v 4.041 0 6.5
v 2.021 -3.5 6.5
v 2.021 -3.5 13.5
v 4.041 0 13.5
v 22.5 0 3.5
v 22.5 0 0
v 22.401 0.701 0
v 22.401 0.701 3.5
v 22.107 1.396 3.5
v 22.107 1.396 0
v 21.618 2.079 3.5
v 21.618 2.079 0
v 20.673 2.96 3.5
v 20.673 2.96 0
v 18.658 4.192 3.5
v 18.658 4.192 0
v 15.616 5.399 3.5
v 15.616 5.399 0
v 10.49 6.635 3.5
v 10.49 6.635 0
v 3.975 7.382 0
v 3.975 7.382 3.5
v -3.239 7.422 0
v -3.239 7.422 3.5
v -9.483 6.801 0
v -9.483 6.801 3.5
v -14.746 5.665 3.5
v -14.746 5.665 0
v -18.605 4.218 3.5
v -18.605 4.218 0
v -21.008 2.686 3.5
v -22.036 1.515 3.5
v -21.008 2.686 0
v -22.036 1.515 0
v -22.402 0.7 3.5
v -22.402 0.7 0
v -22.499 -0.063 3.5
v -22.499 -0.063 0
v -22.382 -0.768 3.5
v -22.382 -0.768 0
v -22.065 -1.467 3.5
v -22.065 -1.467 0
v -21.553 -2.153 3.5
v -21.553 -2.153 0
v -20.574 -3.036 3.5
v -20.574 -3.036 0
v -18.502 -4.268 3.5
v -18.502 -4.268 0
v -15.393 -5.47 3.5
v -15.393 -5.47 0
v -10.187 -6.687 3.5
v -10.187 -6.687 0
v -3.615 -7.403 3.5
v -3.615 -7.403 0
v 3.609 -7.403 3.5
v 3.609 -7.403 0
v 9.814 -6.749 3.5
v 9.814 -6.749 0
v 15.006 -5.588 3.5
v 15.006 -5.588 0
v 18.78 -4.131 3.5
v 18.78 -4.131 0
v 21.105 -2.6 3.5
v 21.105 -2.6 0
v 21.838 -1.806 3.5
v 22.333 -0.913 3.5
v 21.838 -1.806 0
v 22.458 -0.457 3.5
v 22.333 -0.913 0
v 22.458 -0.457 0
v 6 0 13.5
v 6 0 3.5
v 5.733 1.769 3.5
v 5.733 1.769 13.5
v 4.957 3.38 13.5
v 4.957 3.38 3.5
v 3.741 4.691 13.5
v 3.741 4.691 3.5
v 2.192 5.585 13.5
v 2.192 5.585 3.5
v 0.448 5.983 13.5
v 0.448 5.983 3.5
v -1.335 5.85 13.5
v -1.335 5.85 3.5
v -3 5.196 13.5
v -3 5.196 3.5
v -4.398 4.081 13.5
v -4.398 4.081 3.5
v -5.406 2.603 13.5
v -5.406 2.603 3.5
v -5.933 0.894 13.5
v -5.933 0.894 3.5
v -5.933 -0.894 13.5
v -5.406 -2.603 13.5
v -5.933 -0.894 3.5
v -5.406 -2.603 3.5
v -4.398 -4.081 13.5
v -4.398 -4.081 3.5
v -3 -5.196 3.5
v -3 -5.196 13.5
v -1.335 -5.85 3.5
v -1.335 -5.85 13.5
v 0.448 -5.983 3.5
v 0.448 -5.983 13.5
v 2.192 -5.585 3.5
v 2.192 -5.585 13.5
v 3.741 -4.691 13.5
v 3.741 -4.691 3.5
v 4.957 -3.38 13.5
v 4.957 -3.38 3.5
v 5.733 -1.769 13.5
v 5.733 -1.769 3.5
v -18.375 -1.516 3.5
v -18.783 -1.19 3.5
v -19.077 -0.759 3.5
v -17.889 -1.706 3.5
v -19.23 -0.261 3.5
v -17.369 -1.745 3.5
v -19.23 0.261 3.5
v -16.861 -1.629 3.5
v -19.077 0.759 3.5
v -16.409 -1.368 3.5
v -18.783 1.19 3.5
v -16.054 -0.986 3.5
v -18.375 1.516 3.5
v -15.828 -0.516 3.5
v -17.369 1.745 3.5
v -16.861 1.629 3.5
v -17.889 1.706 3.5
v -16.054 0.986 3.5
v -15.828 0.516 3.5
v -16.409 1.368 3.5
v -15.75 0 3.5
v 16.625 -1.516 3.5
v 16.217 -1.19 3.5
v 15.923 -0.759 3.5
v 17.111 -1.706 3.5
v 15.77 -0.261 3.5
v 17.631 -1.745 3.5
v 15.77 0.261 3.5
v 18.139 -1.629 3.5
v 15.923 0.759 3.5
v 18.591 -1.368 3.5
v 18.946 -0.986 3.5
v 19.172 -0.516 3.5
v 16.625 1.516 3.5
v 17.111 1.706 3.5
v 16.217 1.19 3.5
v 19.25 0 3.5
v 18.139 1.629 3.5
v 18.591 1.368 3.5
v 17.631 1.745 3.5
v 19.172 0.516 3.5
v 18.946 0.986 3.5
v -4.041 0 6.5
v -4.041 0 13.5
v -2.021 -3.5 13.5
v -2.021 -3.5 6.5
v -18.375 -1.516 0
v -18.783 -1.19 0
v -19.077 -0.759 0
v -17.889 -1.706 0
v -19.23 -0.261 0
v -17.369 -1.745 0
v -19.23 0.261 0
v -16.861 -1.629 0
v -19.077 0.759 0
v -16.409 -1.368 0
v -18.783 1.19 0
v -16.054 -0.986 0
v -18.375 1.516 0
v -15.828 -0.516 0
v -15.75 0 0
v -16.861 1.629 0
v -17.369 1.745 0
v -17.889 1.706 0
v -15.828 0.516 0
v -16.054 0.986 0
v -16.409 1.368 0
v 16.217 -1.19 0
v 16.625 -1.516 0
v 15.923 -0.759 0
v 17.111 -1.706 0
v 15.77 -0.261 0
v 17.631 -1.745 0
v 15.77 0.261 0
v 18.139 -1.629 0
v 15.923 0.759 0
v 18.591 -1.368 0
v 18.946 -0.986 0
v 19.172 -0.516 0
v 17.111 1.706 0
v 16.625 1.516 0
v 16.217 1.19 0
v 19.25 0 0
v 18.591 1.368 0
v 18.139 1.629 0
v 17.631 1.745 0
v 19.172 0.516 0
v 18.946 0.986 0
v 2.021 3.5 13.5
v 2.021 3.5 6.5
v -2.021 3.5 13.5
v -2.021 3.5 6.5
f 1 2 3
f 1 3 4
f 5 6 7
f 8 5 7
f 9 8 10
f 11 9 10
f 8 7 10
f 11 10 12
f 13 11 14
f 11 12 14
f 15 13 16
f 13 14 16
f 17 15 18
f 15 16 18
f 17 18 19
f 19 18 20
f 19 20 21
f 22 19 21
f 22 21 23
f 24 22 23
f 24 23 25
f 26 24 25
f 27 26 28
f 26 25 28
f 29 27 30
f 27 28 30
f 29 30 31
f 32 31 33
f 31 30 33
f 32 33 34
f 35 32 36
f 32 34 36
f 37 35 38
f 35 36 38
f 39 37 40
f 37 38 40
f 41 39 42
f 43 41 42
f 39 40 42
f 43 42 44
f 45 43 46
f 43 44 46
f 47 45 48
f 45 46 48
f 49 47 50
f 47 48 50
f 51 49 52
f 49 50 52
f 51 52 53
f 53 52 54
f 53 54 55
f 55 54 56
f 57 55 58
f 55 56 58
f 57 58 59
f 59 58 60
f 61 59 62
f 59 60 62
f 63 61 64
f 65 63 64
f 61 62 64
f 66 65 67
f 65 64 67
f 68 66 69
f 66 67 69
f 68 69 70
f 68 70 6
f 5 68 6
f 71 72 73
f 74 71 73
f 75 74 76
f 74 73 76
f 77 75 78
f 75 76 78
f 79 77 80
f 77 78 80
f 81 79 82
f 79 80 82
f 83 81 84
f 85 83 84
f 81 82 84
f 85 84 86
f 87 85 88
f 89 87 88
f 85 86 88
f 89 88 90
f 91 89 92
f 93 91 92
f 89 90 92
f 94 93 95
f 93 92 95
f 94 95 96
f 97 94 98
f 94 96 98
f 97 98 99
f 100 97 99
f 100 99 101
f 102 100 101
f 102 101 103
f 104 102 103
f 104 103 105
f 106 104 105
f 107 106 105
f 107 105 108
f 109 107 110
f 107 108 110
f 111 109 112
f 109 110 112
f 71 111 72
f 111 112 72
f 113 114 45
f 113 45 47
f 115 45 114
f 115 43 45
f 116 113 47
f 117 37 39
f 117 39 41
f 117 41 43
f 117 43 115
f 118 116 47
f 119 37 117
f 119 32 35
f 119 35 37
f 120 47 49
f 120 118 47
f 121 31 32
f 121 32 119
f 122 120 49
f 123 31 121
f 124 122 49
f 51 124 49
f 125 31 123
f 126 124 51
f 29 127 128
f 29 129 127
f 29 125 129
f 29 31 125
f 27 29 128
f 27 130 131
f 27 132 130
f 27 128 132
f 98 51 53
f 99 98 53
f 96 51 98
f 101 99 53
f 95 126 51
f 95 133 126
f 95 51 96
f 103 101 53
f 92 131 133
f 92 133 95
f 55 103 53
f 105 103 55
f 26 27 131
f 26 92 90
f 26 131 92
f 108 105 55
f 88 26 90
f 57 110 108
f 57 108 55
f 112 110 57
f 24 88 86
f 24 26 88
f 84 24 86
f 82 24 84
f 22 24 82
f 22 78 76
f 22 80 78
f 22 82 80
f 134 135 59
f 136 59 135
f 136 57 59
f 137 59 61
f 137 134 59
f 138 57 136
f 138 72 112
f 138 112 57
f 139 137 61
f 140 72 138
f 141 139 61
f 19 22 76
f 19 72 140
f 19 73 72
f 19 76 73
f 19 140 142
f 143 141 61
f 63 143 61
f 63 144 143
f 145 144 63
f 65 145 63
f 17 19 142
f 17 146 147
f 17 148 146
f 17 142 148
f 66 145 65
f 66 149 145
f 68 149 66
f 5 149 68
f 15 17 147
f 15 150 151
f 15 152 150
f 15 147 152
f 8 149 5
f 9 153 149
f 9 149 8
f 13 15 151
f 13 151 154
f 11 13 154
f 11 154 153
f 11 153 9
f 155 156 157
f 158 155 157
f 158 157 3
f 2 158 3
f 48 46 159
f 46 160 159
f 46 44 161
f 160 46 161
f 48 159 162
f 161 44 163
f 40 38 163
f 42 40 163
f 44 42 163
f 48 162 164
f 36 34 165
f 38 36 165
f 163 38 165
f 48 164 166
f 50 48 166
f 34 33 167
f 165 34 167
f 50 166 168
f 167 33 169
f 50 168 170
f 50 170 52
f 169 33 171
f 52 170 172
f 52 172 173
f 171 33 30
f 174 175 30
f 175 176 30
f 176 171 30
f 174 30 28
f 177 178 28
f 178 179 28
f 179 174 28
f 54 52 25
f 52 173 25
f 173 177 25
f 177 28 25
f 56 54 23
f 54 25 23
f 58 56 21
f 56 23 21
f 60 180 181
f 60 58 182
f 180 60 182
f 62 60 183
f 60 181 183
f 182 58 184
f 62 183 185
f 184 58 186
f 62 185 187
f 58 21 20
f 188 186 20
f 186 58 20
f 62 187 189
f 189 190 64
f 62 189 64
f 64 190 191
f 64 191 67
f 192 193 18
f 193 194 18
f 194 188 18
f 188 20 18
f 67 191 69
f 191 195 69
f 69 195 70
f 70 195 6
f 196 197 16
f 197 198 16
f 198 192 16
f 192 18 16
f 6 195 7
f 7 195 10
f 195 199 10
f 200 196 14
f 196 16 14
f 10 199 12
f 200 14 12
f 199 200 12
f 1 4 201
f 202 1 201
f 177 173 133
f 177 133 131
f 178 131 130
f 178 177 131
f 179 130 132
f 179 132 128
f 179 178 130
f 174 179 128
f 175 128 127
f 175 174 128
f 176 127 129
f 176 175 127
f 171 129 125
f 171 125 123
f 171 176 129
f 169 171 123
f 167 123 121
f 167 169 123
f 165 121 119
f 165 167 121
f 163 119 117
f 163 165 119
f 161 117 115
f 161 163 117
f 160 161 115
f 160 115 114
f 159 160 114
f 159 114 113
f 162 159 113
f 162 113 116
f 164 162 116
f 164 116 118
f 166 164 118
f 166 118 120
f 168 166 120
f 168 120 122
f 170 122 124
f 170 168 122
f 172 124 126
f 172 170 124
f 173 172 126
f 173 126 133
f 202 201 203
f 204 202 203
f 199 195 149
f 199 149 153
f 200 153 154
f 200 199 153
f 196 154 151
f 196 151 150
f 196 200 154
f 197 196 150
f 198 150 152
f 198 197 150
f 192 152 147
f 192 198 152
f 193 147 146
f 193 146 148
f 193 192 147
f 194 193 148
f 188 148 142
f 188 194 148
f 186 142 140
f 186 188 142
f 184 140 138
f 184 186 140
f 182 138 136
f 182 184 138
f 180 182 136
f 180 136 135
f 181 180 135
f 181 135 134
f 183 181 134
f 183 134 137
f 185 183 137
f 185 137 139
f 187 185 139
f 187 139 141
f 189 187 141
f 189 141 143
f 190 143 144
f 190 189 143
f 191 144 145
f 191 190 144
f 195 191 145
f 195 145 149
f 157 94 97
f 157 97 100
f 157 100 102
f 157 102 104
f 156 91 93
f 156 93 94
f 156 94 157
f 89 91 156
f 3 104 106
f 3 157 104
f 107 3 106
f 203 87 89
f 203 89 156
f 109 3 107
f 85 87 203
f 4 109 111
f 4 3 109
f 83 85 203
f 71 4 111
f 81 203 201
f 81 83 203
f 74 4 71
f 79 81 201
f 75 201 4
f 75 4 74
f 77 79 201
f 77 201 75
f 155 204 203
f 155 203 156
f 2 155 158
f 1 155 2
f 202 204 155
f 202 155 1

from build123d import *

# Parameters (mm, degrees)
SKETCH1_RX          = 22.5
SKETCH1_RY          = 7.5
SKETCH1_R           = 1.75
BOSS_EXTRUDE2_DEPTH = 3.5
SKETCH3_R           = 6
BOSS_EXTRUDE3_DEPTH = 10
CUT_EXTRUDE5_DEPTH  = 7


with BuildPart() as part:
    # Sketch1 → Boss-Extrude2 (new body)
    with BuildSketch(Plane.XY):
        with Locations((0, 0)):
            Ellipse(SKETCH1_RX, SKETCH1_RY)
        with Locations((-17.5, 0)):
            Circle(SKETCH1_R, mode=Mode.SUBTRACT)
        with Locations((17.5, 0)):
            Circle(SKETCH1_R, mode=Mode.SUBTRACT)
    extrude(amount=BOSS_EXTRUDE2_DEPTH)

    # Sketch3 → Boss-Extrude3 (add)
    with BuildSketch(Plane.XY.offset(3.5)):
        Circle(SKETCH3_R)
    extrude(amount=BOSS_EXTRUDE3_DEPTH)

    # Sketch4 → Cut-Extrude5 (cut)
    with BuildSketch(Plane.XY.offset(13.5)):
        Polygon((4.041451884, 0), (2.020725942, 3.5), (-2.020725942, 3.5), (-4.041451884, 0), (-2.020725942, -3.5), (2.020725942, -3.5), align=None)
    extrude(amount=-CUT_EXTRUDE5_DEPTH, mode=Mode.SUBTRACT)


solid = part.part
